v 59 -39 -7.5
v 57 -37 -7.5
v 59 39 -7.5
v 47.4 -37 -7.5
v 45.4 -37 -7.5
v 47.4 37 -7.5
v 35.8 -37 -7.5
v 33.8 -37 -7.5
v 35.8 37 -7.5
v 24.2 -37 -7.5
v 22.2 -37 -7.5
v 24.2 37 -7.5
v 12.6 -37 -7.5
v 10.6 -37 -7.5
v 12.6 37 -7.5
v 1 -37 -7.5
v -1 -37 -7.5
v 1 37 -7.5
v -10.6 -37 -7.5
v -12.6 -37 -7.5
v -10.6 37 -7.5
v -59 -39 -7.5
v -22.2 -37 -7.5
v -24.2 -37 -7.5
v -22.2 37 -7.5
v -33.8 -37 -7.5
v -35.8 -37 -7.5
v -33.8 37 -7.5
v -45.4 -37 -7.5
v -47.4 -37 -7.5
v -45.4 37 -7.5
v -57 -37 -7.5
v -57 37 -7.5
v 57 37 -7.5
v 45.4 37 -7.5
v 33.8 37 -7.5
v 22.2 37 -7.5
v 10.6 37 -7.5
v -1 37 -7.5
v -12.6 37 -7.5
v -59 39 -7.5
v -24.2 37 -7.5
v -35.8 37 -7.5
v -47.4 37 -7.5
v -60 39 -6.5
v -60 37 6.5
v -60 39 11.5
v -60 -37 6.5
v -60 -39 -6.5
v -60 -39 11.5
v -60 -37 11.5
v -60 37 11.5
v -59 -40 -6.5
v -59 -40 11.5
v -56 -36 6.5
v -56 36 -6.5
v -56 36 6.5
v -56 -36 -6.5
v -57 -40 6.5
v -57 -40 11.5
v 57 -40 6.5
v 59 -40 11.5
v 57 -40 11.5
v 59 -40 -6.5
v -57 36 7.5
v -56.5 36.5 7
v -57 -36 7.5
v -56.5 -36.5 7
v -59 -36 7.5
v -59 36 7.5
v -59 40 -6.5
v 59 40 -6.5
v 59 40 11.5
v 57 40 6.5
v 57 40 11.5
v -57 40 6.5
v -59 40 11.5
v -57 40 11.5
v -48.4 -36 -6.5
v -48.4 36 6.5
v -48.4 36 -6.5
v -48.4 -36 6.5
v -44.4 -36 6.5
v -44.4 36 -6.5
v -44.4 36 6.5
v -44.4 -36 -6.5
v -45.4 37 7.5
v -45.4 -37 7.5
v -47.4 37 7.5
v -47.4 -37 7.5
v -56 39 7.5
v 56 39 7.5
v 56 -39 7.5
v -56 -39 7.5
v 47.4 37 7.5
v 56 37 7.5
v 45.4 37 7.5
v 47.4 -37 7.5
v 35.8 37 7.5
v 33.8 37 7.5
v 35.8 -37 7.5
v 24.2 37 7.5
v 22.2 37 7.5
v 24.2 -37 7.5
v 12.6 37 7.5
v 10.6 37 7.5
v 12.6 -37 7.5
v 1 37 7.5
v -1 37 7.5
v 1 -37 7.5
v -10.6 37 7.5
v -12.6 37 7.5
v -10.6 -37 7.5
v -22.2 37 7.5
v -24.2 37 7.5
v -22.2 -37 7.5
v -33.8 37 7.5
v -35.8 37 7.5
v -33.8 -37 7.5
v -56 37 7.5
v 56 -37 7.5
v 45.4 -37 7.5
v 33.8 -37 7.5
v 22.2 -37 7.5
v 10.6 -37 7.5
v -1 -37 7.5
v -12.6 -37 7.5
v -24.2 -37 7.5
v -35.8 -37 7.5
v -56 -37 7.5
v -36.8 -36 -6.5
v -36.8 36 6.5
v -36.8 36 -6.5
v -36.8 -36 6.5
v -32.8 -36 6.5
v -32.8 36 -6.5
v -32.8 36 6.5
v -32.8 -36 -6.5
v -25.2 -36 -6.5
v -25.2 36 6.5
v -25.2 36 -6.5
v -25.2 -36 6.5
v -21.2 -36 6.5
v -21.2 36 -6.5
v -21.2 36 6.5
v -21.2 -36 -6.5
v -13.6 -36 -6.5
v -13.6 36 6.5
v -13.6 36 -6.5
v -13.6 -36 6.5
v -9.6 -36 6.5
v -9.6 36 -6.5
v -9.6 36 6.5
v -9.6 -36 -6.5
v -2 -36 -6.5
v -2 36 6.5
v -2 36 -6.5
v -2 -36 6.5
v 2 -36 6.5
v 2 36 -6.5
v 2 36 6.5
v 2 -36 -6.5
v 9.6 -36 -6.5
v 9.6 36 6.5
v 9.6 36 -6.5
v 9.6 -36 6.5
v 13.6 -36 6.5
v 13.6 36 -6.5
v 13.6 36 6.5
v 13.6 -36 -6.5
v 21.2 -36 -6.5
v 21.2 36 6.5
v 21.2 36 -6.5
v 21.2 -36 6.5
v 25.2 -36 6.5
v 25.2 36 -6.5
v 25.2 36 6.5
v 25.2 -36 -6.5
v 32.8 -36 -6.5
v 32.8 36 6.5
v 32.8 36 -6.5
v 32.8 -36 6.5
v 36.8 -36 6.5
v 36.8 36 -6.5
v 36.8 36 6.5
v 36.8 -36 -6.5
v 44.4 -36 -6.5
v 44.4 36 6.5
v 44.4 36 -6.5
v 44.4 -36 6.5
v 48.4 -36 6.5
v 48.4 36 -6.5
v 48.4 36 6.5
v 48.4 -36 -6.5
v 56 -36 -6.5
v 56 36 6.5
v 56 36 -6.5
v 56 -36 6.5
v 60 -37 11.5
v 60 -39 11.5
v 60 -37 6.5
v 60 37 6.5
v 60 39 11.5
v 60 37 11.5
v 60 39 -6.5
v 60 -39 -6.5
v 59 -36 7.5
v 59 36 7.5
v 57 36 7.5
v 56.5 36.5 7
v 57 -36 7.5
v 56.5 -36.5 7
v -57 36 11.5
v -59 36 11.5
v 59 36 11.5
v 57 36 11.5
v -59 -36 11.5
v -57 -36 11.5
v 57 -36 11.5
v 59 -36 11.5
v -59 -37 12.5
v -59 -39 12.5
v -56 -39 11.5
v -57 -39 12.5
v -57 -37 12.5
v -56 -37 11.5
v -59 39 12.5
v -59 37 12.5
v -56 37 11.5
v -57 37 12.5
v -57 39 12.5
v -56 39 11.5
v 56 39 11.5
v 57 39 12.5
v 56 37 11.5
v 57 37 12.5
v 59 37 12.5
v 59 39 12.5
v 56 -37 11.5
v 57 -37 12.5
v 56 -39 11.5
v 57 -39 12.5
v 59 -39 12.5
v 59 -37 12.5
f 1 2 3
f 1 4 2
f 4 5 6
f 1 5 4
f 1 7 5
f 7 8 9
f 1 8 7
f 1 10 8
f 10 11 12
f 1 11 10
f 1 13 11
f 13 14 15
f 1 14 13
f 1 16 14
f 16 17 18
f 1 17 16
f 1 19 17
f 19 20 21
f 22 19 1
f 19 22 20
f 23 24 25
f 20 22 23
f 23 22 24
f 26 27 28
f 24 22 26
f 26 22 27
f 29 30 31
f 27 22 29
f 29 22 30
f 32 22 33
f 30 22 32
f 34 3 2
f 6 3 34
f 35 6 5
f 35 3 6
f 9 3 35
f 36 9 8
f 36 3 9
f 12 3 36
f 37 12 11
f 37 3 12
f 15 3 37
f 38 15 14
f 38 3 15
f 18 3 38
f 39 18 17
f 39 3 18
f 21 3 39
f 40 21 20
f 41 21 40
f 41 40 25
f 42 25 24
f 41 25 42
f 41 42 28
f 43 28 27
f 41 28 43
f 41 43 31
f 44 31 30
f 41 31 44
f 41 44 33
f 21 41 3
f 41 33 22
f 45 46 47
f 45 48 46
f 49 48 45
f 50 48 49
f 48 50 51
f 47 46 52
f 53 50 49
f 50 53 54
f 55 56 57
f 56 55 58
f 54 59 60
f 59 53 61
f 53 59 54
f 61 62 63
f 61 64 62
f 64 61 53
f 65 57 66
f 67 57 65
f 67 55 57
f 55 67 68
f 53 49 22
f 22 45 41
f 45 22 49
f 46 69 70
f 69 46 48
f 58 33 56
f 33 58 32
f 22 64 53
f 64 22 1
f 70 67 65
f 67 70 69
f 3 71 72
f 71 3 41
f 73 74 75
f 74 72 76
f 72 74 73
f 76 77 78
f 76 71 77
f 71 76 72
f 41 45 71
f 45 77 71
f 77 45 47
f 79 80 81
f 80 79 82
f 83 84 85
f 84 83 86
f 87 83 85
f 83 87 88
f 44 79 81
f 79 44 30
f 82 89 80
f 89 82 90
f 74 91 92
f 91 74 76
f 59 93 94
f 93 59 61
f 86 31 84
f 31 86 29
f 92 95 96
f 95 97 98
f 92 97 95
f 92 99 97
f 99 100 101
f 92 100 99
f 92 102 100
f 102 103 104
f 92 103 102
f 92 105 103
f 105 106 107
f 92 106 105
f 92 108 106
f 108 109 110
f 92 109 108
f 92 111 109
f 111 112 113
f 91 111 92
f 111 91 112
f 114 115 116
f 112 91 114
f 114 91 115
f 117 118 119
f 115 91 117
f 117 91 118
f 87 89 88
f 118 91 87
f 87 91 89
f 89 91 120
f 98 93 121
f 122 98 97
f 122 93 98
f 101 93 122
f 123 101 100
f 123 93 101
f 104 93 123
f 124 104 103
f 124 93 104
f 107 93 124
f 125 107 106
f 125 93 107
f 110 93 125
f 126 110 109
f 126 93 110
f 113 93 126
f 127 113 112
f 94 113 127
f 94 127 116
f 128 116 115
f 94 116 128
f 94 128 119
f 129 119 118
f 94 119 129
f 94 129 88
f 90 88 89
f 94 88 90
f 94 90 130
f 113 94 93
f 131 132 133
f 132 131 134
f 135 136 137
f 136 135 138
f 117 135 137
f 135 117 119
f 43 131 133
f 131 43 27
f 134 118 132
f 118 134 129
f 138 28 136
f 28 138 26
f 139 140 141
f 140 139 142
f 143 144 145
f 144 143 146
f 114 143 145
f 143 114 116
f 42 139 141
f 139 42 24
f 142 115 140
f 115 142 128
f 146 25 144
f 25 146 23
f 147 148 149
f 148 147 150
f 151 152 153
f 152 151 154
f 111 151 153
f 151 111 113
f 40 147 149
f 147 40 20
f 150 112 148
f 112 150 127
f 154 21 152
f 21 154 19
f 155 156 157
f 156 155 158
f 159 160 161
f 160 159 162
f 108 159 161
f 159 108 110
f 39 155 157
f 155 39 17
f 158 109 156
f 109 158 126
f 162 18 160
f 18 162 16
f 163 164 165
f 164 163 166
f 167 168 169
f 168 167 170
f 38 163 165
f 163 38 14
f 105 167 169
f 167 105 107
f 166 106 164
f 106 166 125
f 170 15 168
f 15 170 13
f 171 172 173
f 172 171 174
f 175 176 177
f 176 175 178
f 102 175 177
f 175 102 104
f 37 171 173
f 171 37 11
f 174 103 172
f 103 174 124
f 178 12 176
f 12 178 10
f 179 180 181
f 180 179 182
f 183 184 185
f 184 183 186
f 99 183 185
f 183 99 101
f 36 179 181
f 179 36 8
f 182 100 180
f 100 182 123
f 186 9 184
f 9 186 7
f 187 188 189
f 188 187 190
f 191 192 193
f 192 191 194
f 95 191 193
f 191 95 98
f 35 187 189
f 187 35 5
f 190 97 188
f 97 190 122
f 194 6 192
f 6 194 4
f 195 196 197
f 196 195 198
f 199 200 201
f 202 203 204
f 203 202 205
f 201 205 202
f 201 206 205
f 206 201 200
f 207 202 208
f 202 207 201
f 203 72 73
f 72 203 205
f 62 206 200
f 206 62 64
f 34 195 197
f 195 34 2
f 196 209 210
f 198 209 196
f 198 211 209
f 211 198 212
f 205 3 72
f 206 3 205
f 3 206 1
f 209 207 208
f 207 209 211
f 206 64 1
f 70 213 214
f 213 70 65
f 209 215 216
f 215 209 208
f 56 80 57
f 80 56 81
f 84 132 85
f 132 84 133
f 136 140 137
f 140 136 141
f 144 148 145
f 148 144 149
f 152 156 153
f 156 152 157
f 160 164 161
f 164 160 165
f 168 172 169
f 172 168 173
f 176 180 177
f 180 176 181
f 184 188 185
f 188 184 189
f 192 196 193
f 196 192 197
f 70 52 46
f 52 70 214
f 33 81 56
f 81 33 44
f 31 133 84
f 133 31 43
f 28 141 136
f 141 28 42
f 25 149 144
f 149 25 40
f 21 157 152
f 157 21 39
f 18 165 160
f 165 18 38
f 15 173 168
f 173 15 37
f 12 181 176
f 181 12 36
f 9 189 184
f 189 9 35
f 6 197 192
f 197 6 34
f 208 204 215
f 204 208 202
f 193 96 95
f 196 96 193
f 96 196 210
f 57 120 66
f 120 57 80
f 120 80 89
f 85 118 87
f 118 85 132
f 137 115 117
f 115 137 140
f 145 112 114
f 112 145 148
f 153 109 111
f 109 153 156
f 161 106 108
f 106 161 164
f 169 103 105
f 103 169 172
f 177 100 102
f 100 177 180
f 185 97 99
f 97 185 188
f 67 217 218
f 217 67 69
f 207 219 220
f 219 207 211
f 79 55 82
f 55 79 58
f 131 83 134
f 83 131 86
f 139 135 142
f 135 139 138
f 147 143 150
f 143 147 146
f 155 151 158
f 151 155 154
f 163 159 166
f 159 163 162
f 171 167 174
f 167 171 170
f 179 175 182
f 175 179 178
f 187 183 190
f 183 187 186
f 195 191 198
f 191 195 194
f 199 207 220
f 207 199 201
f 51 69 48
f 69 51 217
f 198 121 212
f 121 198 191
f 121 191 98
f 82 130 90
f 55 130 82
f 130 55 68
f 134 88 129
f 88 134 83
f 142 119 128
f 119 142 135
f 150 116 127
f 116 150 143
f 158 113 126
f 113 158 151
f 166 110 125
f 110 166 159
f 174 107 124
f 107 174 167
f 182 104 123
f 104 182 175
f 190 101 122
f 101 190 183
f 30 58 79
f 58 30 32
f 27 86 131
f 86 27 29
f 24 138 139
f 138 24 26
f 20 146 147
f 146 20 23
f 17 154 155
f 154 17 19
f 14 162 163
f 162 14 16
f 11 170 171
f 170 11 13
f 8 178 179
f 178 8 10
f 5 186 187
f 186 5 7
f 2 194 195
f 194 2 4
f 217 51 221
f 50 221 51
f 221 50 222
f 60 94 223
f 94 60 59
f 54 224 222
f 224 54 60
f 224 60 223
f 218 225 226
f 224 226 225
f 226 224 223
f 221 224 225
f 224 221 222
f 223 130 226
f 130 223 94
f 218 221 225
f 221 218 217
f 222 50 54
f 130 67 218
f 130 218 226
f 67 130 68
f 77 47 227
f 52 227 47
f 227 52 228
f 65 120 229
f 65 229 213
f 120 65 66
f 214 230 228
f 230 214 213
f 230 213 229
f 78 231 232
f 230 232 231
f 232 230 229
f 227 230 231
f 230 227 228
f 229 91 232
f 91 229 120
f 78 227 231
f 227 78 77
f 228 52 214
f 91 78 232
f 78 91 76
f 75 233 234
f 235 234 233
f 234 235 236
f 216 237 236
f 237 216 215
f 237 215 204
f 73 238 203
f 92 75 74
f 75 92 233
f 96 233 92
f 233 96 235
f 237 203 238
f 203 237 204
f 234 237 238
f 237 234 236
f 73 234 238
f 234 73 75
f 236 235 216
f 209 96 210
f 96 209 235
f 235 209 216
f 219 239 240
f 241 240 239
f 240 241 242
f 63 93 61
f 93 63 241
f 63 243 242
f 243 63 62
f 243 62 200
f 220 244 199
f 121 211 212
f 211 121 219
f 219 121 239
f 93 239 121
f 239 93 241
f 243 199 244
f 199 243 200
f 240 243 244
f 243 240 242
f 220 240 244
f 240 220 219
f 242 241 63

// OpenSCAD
/* * * * * * * * * * * * * * * * * * * * * * * * * * * * * * * * * * * * *\
 * Copyright (C) Claus Schrammel <claus@f05fk.net>                       *
 *                                                                       *
 * This program is free software: you can redistribute it and/or modify  *
 * it under the terms of the GNU General Public License as published by  *
 * the Free Software Foundation, either version 3 of the License, or     *
 * (at your option) any later version.                                   *
 *                                                                       *
 * This program is distributed in the hope that it will be useful,       *
 * but WITHOUT ANY WARRANTY; without even the implied warranty of        *
 * MERCHANTABILITY or FITNESS FOR A PARTICULAR PURPOSE.  See the         *
 * GNU General Public License for more details.                          *
 *                                                                       *
 * You should have received a copy of the GNU General Public License     *
 * along with this program.  If not, see <http://www.gnu.org/licenses/>. *
 *                                                                       *
 * SPDX-License-Identifier: GPL-3.0-or-later                             *
\* * * * * * * * * * * * * * * * * * * * * * * * * * * * * * * * * * * * */

module bevelCube(size, bevel) {
    hull() {
        cube([size[0] - 2 * bevel, size[1] - 2 * bevel, size[2]], center = true);
        cube([size[0] - 2 * bevel, size[1], size[2] - 2 * bevel], center = true);
        cube([size[0], size[1] - 2 * bevel, size[2] - 2 * bevel], center = true);
    }
}

translate([0,  38, 0]) bevelCube([120, 4, 15], 1);
translate([0, -38, 0]) bevelCube([120, 4, 15], 1);

for (i = [0:10]) {
    translate([-58 + i * 116 / 10, 0, 0]) bevelCube([4, 80, 15], 1);
}

translate([-58, -38, 5]) bevelCube([4, 4, 15], 1);
translate([-58, +38, 5]) bevelCube([4, 4, 15], 1);
translate([+58, +38, 5]) bevelCube([4, 4, 15], 1);
translate([+58, -38, 5]) bevelCube([4, 4, 15], 1);
